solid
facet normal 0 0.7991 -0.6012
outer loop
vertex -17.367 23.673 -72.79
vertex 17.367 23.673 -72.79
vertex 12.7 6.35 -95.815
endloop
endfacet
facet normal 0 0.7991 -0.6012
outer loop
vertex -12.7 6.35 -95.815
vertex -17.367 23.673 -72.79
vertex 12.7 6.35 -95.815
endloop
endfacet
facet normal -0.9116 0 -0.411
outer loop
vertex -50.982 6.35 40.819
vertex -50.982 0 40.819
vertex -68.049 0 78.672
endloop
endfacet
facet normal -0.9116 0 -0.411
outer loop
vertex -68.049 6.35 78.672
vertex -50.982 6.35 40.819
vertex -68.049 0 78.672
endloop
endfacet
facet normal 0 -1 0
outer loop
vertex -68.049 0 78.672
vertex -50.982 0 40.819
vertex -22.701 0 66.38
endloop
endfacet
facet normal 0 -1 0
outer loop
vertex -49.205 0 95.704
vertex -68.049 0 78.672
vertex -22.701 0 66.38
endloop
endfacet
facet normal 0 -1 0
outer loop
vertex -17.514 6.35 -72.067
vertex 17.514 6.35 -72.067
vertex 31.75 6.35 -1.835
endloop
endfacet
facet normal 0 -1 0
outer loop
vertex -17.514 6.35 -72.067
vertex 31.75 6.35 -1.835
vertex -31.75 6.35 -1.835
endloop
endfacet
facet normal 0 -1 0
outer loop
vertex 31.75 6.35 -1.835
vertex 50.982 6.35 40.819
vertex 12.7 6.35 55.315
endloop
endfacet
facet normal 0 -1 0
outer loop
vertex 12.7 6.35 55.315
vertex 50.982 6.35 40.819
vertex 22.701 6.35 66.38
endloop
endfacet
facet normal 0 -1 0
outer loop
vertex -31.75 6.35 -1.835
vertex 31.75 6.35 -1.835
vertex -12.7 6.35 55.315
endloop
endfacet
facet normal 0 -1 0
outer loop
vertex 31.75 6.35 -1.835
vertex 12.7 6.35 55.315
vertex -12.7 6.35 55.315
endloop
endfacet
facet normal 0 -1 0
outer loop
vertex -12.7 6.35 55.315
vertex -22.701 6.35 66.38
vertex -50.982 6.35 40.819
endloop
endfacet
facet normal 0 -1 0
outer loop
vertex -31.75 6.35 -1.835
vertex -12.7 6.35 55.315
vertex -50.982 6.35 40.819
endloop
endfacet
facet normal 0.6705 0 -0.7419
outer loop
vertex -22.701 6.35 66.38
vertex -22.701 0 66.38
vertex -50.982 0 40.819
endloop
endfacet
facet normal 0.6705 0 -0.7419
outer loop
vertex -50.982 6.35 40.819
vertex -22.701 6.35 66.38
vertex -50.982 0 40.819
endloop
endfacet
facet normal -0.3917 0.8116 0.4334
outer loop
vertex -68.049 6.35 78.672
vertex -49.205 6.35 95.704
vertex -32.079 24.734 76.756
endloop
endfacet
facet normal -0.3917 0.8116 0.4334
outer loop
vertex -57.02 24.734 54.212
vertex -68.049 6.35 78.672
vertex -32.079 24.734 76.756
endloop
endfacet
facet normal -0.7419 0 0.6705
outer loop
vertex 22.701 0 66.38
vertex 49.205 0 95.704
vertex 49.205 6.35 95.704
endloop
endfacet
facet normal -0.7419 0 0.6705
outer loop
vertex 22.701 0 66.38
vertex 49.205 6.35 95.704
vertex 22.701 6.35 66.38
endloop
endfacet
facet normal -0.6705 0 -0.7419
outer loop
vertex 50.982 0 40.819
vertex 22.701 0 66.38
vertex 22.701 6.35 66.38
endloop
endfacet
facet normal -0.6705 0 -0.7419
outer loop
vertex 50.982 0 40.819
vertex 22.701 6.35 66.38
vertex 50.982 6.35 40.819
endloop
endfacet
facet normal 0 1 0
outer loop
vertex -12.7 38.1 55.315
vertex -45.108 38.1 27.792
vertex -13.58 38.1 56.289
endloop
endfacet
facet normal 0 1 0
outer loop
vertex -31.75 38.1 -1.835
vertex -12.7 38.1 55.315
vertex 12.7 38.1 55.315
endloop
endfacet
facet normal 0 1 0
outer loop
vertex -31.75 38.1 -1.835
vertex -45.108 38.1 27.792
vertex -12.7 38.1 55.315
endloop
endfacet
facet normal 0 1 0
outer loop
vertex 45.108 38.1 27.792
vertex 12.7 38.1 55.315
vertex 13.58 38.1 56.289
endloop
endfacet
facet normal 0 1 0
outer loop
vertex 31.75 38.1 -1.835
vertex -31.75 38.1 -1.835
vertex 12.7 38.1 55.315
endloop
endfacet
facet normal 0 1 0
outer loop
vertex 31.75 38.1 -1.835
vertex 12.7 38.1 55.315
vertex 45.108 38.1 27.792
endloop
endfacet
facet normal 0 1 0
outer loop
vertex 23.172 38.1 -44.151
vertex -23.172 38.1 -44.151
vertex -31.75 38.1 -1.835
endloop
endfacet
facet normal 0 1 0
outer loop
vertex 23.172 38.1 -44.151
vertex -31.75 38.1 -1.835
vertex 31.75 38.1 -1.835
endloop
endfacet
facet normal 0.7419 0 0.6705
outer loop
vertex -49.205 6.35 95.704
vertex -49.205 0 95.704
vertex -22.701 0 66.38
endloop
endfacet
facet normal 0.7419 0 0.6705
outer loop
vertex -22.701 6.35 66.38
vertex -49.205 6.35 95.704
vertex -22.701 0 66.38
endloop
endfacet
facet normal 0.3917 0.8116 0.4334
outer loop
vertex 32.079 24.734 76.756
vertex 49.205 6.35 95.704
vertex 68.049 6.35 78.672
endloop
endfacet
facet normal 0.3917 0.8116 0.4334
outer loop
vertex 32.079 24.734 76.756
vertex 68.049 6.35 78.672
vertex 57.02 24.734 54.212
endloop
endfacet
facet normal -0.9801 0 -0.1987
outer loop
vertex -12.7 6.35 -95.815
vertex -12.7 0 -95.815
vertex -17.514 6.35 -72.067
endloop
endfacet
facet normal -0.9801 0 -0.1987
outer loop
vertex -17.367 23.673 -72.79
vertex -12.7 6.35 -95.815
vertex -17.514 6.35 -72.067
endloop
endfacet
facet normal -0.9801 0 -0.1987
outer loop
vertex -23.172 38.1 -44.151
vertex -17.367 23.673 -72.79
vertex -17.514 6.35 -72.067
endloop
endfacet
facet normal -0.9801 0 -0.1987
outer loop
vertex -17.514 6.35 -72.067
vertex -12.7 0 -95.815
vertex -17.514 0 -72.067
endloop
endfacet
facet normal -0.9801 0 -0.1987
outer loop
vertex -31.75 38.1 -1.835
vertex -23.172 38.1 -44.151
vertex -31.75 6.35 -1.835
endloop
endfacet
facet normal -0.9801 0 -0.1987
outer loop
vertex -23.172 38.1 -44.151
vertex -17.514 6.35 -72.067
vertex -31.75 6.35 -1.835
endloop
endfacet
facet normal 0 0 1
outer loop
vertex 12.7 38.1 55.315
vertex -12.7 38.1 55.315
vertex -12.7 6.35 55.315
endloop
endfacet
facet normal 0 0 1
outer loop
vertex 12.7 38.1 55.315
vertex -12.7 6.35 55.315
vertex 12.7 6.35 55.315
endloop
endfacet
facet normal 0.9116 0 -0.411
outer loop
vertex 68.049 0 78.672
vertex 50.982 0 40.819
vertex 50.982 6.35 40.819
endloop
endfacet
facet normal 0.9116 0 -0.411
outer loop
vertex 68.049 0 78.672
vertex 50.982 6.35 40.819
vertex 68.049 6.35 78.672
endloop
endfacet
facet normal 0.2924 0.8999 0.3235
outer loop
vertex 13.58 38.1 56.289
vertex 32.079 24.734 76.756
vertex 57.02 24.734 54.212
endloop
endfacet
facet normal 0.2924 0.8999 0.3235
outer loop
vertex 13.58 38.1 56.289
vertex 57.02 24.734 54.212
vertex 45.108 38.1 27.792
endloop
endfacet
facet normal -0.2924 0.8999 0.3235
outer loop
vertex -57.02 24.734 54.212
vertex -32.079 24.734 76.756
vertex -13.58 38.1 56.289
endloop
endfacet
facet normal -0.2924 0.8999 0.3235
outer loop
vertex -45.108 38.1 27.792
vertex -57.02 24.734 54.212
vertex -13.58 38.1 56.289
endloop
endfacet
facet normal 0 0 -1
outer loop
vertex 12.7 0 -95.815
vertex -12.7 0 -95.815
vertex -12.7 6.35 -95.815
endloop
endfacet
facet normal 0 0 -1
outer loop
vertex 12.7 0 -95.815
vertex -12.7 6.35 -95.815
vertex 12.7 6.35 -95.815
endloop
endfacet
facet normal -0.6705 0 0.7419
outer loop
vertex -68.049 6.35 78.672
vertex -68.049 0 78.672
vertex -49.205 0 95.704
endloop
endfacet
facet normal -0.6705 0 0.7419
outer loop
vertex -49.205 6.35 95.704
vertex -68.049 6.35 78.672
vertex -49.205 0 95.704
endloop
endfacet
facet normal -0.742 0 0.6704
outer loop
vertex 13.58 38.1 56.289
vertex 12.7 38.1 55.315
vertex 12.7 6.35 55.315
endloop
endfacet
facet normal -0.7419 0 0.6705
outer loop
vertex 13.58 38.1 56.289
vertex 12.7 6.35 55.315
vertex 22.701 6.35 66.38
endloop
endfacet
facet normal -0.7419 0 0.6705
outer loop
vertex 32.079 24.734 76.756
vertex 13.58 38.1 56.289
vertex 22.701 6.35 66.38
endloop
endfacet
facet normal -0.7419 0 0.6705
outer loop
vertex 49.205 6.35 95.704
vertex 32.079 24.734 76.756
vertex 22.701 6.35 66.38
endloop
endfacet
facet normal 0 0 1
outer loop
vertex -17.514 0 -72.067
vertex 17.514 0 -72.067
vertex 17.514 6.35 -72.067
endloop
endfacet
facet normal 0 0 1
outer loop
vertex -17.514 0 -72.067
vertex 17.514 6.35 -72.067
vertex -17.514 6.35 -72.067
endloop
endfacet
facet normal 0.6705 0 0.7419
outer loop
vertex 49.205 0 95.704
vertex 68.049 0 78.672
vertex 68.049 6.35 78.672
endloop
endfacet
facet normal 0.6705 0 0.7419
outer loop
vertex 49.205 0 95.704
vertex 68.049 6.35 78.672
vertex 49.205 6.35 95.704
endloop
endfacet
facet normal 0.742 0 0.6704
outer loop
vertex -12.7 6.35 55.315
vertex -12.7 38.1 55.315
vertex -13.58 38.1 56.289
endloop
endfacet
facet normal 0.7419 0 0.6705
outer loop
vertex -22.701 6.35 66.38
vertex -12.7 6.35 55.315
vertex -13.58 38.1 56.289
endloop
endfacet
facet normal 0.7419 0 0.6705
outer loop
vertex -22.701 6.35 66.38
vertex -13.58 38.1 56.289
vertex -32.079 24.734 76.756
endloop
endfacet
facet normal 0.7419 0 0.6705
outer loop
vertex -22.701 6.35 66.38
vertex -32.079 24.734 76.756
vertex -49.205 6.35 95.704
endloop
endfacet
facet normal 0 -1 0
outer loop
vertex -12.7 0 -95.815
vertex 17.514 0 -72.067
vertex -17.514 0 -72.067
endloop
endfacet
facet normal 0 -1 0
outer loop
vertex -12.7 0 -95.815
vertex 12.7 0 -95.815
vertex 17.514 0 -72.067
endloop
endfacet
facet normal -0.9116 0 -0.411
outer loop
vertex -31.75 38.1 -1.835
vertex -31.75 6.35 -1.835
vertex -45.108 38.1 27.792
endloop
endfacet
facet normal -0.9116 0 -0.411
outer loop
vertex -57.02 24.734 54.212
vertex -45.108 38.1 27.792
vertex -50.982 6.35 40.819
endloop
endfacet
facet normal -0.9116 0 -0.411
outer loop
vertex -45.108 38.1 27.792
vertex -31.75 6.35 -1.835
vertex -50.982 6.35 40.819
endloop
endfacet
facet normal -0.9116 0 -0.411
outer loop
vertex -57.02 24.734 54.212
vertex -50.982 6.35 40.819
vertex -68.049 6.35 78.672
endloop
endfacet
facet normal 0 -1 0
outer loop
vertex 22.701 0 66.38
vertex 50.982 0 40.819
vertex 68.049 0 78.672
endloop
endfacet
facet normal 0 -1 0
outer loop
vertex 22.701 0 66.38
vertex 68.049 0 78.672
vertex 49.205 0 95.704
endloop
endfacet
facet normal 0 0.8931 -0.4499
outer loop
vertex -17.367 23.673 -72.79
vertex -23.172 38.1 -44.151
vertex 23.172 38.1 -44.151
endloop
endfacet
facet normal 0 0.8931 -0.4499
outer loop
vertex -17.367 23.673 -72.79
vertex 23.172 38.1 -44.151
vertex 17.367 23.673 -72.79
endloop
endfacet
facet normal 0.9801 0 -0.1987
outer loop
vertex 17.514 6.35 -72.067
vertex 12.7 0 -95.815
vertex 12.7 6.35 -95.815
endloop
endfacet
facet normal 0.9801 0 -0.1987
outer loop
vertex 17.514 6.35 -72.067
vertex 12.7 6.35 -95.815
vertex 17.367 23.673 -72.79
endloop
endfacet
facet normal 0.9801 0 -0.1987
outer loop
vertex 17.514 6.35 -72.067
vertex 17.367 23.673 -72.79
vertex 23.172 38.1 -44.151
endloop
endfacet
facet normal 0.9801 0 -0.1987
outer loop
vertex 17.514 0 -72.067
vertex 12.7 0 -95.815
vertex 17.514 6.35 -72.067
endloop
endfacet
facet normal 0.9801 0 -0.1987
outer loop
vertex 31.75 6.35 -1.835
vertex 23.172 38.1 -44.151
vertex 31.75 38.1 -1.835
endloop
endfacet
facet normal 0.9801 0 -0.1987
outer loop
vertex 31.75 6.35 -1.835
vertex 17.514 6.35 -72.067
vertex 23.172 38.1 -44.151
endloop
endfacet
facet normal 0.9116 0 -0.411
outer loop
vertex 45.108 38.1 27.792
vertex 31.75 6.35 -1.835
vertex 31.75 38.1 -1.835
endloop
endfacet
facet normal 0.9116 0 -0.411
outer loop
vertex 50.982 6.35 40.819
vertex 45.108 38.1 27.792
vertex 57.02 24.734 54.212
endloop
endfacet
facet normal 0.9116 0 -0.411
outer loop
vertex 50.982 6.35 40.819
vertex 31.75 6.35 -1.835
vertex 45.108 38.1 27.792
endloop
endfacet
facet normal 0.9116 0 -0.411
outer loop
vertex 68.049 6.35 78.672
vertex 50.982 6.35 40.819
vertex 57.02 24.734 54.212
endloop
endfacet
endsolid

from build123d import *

# Parameters (mm, degrees)
BOSS_EXTRUDE1_DEPTH = 6.35
BOSS_EXTRUDE2_REACH = 146.797
BOSS_EXTRUDE4_REACH = 127.921
BOSS_EXTRUDE5_DEPTH = 31.75
SKETCH6_W           = 35.398432863
SKETCH6_H           = 63.441579166
CUT_EXTRUDE3_DEPTH  = 124.542305817
CUT_EXTRUDE2_DEPTH  = 6.35


with BuildPart() as part:
    # Sketch1 → Boss-Extrude1 (new body)
    with BuildSketch(Plane(origin=(0, 0, 0), x_dir=(1, 0, 0), z_dir=(0, 1, 0))):
        Polygon((0, 95.814735378), (-12.7, 95.814735378), (-31.75, 1.834735378), (-68.048716454, -78.671924952), (-49.205184033, -95.703697788), (-12.7, -55.315264622), (0, -55.315264622), align=None)
    extrude(amount=BOSS_EXTRUDE1_DEPTH)

    # Boss-Extrude2: up to this plane
    boss_extrude2_end = Plane(origin=(-31.75, 6.35, -1.834735378), z_dir=(0.9116215886149588, 0, 0.4110305088082135))
    # Sketch3 → Boss-Extrude2 (add, up to the surface)
    with BuildSketch(Plane(origin=(20.527176154, 0, 18.553538338), x_dir=(0.6705422376066268, 0, -0.7418713551455524), z_dir=(0.7418713551455524, 0, 0.6705422376066268)), mode=Mode.PRIVATE) as boss_extrude2_sk1:
        Polygon((-103.993986173, 6.35), (-78.453176795, 24.733648606), (-50.864728594, 38.1), (9.629554025, 38.1), (9.629554025, 6.35), align=None)
    boss_extrude2_tool1 = split(extrude(boss_extrude2_sk1.sketch, amount=-BOSS_EXTRUDE2_REACH, mode=Mode.PRIVATE), bisect_by=boss_extrude2_end, keep=Keep.BOTH, mode=Mode.PRIVATE)
    add(boss_extrude2_tool1.solids().sort_by_distance((-3.940159, 20.681693, 45.623593))[0])

    # Boss-Extrude4: up to this plane
    boss_extrude4_end = Plane(origin=(-12.7, 6.35, -95.814735378), z_dir=(0.9800679771232679, 0, 0.19866242779525697))
    # Sketch4 → Boss-Extrude4 (add, up to the surface)
    with BuildSketch(Plane(origin=(0, 0, -3.158589171), x_dir=(0, 0, 1), z_dir=(-1, 0, 0)), mode=Mode.PRIVATE) as boss_extrude4_sk1:
        Polygon((-92.656146207, 6.35), (1.323853793, 6.35), (1.323853793, 38.1), (-40.992152204, 38.1), (-69.631684908, 23.673473414), align=None)
    boss_extrude4_tool1 = split(extrude(boss_extrude4_sk1.sketch, amount=BOSS_EXTRUDE4_REACH, mode=Mode.PRIVATE), bisect_by=boss_extrude4_end, keep=Keep.BOTH, mode=Mode.PRIVATE)
    add(boss_extrude4_tool1.solids().sort_by_distance((0, 20.310013, -38.759281))[0])

    # Sketch5 → Boss-Extrude5 (add)
    with BuildSketch(Plane(origin=(0, 6.35, 0), x_dir=(1, 0, 0), z_dir=(0, 1, 0))):
        Polygon((0, -41.26429858), (0, -55.315264622), (-12.7, -55.315264622), align=None)
    extrude(amount=BOSS_EXTRUDE5_DEPTH)

    # Sketch6 → Cut-Extrude3 (cut, through all)
    with BuildSketch(Plane(origin=(0, 38.1, 0), x_dir=(1, 0, 0), z_dir=(0, 1, 0))):
        with Locations((17.699216432, -13.706659905)):
            Rectangle(SKETCH6_W, SKETCH6_H)
    extrude(amount=-CUT_EXTRUDE3_DEPTH, mode=Mode.SUBTRACT)

    # Sketch7 → Cut-Extrude2 (cut)
    with BuildSketch(Plane.XZ):
        Polygon((-22.7010489, 66.380177888), (-50.981549283, 40.818778494), (-31.75, -1.834735378), (-17.513793047, -72.066689682), (0, -72.066689682), (0, 55.315264622), (-12.7, 55.315264622), align=None)
    extrude(amount=-CUT_EXTRUDE2_DEPTH, mode=Mode.SUBTRACT)

    # Mirror2: part across plane


with BuildPart() as part_1:
    add(part.part)
    add(part.part.mirror(Plane(origin=(0, 0, 0), x_dir=(0, 0, 1), z_dir=(1, 0, 0))))


solid = part_1.part
